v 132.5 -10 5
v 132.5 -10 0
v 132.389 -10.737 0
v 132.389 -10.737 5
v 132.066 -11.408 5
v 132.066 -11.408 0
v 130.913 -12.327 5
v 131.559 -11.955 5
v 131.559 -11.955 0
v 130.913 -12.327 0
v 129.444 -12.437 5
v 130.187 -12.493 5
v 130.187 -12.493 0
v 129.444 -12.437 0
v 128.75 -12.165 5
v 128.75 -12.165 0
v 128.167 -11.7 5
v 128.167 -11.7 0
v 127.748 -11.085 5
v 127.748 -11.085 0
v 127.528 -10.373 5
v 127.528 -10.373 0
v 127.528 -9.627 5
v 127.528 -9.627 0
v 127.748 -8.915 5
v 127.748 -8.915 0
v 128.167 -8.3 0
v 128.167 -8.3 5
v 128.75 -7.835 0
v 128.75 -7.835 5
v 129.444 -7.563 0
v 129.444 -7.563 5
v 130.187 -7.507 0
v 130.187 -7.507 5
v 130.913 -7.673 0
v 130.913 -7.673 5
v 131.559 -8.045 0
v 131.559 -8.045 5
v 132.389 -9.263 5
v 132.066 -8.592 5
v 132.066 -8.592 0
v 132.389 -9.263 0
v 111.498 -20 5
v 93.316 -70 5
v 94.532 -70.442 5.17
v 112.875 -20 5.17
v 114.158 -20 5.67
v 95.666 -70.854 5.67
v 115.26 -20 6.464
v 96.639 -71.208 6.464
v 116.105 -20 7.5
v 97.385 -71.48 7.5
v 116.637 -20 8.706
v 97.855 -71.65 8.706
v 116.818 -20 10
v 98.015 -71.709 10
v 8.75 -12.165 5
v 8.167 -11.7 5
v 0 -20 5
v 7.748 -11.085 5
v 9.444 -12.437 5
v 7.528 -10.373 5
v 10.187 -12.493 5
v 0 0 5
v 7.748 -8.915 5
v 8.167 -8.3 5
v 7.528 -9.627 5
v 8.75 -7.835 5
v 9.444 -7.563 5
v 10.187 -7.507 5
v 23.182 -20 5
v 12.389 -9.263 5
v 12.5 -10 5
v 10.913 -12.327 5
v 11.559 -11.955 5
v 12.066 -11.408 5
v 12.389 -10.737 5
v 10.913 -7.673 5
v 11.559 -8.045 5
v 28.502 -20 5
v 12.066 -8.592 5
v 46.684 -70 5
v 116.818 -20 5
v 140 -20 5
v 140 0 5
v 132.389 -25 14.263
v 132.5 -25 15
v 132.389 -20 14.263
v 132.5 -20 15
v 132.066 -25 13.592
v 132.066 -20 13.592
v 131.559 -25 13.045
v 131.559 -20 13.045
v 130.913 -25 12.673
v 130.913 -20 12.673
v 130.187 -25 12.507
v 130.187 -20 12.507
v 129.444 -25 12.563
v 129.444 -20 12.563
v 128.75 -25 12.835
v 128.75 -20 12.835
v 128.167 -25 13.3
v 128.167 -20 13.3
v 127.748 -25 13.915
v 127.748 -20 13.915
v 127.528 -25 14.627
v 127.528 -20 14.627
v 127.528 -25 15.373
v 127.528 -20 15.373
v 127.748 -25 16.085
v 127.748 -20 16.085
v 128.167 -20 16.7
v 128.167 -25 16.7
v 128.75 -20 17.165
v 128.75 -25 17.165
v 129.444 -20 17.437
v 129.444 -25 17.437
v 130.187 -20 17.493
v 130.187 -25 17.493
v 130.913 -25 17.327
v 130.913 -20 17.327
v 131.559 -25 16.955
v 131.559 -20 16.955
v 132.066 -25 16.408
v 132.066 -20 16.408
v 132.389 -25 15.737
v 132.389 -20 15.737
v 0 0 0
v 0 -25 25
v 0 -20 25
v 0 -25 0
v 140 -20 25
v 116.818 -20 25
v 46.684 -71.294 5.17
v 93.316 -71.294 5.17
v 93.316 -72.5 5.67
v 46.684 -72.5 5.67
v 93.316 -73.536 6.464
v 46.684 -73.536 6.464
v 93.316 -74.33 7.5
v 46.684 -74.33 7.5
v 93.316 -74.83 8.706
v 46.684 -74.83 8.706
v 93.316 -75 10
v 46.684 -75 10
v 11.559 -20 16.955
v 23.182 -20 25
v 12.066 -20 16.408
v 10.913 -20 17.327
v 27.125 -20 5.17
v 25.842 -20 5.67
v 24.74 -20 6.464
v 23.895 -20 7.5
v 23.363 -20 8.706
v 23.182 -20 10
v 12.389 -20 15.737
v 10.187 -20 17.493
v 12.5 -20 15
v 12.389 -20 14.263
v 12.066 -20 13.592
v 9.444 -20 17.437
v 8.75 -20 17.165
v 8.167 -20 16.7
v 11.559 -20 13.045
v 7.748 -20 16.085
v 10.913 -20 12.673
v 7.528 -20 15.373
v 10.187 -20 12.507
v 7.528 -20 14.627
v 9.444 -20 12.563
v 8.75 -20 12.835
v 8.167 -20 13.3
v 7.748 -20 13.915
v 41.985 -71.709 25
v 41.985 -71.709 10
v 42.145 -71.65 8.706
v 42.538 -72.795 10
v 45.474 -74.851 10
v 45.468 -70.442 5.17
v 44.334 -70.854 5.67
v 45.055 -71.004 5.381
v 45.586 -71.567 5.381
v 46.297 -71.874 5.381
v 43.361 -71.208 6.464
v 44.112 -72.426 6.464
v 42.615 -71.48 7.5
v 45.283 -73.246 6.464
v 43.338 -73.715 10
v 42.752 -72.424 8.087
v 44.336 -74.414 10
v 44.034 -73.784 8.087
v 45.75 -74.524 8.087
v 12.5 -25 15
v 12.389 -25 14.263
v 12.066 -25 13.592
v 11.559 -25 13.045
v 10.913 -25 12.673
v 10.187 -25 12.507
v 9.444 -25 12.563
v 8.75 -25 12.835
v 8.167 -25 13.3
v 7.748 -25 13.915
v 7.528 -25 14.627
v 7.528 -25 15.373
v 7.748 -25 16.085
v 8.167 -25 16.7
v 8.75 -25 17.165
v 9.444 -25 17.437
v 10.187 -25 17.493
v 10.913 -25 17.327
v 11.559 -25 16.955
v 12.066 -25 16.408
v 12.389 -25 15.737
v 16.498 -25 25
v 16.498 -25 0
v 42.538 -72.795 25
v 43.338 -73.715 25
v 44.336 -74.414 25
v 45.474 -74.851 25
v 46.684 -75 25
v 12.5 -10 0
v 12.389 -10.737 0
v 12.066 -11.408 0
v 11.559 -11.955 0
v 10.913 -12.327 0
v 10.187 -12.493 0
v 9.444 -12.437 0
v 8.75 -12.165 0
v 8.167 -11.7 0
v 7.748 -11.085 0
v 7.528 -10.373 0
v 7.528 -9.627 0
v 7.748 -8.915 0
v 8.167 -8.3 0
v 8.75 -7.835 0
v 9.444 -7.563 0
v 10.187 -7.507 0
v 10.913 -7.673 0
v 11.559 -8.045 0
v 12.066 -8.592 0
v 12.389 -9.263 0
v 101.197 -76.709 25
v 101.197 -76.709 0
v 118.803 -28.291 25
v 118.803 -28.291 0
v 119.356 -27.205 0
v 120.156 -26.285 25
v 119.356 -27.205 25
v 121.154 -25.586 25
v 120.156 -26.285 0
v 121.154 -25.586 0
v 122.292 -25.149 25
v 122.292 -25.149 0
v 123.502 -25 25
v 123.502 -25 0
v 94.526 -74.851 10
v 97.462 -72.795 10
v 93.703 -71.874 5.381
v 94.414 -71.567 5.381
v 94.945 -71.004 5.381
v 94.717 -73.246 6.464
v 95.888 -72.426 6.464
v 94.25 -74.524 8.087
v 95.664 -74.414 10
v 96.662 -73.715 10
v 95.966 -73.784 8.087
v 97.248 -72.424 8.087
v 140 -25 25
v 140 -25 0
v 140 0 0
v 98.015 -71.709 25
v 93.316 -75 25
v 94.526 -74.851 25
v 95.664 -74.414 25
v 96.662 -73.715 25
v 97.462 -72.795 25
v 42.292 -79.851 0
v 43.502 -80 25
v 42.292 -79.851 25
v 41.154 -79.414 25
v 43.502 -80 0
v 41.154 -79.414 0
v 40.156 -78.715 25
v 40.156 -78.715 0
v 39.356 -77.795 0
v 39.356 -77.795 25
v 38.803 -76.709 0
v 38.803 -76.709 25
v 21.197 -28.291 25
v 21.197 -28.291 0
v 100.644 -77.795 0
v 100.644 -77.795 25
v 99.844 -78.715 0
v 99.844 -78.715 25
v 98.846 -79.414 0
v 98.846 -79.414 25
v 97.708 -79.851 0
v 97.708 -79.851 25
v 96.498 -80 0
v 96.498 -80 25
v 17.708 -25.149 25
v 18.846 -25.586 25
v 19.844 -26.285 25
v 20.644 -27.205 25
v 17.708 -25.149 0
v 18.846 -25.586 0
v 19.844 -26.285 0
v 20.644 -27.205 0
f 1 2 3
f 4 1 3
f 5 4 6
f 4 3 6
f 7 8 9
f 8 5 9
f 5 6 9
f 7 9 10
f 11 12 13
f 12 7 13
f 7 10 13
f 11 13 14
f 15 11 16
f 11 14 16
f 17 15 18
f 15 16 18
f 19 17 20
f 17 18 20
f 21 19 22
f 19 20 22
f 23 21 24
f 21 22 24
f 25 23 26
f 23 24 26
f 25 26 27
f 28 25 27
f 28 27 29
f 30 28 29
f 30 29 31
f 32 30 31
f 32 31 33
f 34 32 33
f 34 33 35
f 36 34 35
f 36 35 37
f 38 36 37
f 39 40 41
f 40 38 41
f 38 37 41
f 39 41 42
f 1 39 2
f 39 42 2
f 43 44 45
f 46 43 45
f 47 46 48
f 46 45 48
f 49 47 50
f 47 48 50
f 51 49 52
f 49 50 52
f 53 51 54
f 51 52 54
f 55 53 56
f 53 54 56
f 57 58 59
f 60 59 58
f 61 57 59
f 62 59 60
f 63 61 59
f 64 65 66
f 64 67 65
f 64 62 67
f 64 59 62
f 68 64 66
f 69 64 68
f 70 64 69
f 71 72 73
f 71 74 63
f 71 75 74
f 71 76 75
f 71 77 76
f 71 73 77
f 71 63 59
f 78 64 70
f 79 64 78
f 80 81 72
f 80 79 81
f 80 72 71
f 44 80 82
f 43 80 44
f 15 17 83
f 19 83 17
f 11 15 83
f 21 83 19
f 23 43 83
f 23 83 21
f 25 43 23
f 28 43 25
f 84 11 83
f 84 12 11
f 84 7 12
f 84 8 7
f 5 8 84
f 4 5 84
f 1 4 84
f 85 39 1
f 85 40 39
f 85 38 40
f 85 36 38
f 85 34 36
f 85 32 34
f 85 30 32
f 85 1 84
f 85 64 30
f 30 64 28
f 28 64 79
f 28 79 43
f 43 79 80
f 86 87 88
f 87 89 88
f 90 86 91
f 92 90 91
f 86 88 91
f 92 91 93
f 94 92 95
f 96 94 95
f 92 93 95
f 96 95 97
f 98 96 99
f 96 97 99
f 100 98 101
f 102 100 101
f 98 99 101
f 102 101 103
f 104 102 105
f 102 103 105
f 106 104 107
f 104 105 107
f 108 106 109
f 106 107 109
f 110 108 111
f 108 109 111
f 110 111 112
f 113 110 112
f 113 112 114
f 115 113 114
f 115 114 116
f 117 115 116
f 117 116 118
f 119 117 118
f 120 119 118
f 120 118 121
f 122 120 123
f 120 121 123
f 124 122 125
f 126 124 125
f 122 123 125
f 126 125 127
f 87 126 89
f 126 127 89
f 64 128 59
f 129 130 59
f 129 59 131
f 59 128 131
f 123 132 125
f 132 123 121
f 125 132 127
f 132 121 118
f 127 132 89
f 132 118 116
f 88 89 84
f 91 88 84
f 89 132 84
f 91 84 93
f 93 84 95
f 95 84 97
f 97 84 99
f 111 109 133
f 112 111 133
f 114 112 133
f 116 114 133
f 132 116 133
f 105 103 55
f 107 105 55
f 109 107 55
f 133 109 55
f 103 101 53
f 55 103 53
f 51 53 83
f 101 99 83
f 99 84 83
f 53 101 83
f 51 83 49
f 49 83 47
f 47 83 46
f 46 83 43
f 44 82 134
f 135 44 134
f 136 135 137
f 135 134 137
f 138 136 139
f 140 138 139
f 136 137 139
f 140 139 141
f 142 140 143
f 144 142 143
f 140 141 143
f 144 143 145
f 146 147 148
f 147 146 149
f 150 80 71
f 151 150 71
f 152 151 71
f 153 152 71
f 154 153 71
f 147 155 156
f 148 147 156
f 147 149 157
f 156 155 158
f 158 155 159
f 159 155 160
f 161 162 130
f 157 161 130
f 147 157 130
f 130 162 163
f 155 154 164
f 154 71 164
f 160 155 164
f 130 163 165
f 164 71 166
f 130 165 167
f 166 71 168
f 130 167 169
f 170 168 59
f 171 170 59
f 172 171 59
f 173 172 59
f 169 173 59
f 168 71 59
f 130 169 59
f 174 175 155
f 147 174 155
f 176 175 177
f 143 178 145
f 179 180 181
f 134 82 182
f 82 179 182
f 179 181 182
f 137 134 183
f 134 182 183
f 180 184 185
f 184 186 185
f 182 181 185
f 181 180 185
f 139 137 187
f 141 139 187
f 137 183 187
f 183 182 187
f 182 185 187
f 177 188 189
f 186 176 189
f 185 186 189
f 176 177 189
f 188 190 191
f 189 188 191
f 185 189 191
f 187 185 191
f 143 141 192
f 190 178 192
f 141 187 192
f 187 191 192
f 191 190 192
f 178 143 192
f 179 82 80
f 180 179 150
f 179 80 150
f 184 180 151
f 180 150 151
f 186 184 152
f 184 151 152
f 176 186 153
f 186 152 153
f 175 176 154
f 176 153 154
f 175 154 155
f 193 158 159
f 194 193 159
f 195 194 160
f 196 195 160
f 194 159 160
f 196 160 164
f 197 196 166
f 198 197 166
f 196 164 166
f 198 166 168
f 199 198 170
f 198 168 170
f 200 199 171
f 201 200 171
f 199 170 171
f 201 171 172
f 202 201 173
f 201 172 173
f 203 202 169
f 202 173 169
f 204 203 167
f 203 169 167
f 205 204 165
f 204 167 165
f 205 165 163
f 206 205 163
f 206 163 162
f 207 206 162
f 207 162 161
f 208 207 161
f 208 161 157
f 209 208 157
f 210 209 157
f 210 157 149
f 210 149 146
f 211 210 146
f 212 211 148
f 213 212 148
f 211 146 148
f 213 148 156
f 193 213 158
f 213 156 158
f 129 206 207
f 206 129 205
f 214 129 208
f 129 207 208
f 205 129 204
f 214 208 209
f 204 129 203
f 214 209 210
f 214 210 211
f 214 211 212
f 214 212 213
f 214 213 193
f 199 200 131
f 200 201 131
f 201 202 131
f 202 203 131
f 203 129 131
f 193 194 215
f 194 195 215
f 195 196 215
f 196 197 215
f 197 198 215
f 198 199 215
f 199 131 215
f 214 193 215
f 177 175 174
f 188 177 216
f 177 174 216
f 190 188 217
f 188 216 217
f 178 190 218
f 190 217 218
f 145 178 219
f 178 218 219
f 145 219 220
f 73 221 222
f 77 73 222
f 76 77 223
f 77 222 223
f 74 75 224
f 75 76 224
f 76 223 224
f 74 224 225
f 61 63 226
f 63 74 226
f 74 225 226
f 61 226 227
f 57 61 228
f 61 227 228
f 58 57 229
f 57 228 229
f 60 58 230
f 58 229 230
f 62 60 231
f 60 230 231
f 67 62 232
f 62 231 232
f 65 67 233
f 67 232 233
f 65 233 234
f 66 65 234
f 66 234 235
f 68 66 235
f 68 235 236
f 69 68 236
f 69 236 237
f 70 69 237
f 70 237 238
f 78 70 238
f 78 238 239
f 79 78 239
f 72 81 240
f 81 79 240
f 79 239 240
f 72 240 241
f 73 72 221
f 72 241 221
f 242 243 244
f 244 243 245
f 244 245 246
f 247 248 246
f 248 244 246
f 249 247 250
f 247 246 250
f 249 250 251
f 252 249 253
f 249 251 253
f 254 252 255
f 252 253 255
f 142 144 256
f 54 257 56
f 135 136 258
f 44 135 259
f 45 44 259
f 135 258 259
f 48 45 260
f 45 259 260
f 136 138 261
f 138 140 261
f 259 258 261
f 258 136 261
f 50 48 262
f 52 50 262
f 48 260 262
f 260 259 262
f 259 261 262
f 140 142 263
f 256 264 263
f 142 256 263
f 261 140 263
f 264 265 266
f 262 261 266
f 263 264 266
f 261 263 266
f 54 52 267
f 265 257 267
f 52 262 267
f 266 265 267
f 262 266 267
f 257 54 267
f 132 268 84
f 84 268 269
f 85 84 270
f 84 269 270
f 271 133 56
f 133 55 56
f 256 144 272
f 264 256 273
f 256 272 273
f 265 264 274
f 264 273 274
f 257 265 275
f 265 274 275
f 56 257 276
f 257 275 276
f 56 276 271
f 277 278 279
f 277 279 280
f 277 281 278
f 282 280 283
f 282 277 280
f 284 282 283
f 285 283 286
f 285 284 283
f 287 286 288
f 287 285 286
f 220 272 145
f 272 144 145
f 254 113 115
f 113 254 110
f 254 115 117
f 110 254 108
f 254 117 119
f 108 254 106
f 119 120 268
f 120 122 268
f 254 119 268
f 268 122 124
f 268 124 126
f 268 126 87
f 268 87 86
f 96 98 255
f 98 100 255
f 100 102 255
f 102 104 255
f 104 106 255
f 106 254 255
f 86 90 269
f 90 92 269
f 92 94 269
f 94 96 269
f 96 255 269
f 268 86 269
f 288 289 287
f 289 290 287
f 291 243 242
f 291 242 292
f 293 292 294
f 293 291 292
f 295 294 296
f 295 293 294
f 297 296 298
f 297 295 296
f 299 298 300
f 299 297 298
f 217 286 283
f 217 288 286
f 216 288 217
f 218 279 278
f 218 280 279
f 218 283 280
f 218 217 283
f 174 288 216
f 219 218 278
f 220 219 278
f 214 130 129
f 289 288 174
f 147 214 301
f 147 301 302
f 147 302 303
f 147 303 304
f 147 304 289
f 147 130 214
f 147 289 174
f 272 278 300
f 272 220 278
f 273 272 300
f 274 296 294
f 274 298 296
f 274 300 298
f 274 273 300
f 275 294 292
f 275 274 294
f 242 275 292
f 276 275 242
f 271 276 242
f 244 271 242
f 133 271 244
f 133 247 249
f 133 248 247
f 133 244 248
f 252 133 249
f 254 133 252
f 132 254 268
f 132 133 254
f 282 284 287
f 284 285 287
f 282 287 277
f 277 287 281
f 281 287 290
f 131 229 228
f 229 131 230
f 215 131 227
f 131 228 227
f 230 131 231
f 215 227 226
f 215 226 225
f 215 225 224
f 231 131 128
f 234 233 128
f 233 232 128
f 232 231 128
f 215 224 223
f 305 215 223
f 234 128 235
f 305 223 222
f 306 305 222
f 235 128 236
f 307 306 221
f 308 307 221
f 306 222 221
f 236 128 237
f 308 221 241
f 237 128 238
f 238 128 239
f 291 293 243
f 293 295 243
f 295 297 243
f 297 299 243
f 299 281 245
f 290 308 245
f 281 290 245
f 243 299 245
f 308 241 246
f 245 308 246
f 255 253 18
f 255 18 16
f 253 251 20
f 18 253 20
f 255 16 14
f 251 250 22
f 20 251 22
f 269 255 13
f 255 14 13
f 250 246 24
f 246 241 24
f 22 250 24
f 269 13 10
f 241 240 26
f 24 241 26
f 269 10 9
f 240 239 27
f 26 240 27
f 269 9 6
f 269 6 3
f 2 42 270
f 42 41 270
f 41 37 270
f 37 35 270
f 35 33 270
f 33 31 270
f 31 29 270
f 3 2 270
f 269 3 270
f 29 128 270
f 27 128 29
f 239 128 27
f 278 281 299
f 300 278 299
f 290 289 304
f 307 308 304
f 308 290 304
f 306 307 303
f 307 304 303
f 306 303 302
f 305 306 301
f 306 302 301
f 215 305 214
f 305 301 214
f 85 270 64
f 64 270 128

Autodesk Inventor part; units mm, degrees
ref_plane "YZ Plane" through (0, 0, 0) normal (1, 0, 0) x (0, 1, 0)
ref_plane "XZ Plane" through (0, 0, 0) normal (0, 1, 0) x (-1, 0, 0)
ref_plane "XY Plane" through (0, 0, 0) normal (0, 0, 1) x (1, 0, 0)
sketch "スケッチ1" plane through (0, 0, 0) normal (0, 0, 1) x (1, 0, 0)
  line L0 (0, 0) -> (0, -25)
  line L1 (0, -25) -> (20, -25)
  line L2 (20, -25) -> (40, -80)
  line L3 (40, -80) -> (100, -80)
  line L4 (100, -80) -> (120, -25)
  line L5 (120, -25) -> (140, -25)
  line L6 (140, -25) -> (140, 0)
  line L7 (140, 0) -> (0, 0)
  line L8 (0, -20) -> (140, -20) construction
  line L9 (0, -10) -> (140, -10) construction
  circle A0 centre (10, -10) radius 2.5
  circle A1 centre (130, -10) radius 2.5
  dimension "d14" = 20
  dimension "d15" = 25
  dimension "d16" = 140
  dimension "d17" = 20
  dimension "d18" = 60
  dimension "d19" = 60
  dimension "d20" = 5
  dimension "d21" = 10
  dimension "d22" = 10
  dimension "d23" = 10
extrude "押し出し3" add sketch "スケッチ1" along normal blind 5
sketch "スケッチ3" plane through (0, 0, 5) normal (0, 0, 1) x (1, 0, 0)
  line L0 (0, 0) -> (0, -25) projected
  line L1 (0, -20) -> (0, -25)
  line L2 (0, -25) -> (20, -25) projected
  line L3 (0, -25) -> (20, -25)
  line L4 (20, -25) -> (40, -80) projected
  line L5 (20, -25) -> (40, -80)
  line L6 (40, -80) -> (100, -80) projected
  line L7 (40, -80) -> (100, -80)
  line L8 (120, -25) -> (140, -25) projected
  line L9 (100, -80) -> (120, -25)
  line L10 (120, -25) -> (140, -25)
  line L11 (140, -25) -> (140, 0)
  line L12 (140, -25) -> (140, -20)
  line L13 (140, -20) -> (116.8182, -20)
  line L14 (116.8182, -20) -> (96.8182, -75)
  line L15 (96.8182, -75) -> (43.1818, -75)
  line L16 (43.1818, -75) -> (23.1818, -20)
  line L17 (23.1818, -20) -> (0, -20)
  line L18 (100, -80) -> (120, -25) projected
  line L19 (43.1818, -75) -> (45, -80) construction
  dimension "d26" = 5
  dimension "d28" = 5
  dimension "d29" = 5
extrude "押し出し4" add sketch "スケッチ3" along normal blind 20
sketch "スケッチ4" plane through (116.8182, -20, 5) normal (0, 1, 0) x (1, 0, 0)
  line L0 (23.1818, 5) -> (23.1818, -20) construction
  line L1 (23.1818, -10) -> (-116.4286, -10) construction
  line L2 (23.1818, -20) -> (0, -20) construction
  circle A0 centre (13.1818, -10) radius 2.5
  circle A1 centre (-106.8182, -10) radius 2.5
  line L3 (-116.8182, 0) -> (-116.8182, -20) construction
  point P0 (-116.8182, 5)
  dimension "d32" = 10
  dimension "d33" = 10
  dimension "d34" = 5
  dimension "d35" = 10
extrude "押し出し5" cut sketch "スケッチ4" against normal blind 20
fillet "フィレット1" radius 5 3 edges at (33.1818, -47.5, 5) (70, -75, 5) (106.8182, -47.5, 5)
fillet "フィレット1" radius 5 6 edges at (20, -25, 12.5) (120, -25, 12.5) (43.1818, -75, 15) (96.8182, -75, 15) (40, -80, 12.5) (100, -80, 12.5)
properties part number "エンコーダガード2"
